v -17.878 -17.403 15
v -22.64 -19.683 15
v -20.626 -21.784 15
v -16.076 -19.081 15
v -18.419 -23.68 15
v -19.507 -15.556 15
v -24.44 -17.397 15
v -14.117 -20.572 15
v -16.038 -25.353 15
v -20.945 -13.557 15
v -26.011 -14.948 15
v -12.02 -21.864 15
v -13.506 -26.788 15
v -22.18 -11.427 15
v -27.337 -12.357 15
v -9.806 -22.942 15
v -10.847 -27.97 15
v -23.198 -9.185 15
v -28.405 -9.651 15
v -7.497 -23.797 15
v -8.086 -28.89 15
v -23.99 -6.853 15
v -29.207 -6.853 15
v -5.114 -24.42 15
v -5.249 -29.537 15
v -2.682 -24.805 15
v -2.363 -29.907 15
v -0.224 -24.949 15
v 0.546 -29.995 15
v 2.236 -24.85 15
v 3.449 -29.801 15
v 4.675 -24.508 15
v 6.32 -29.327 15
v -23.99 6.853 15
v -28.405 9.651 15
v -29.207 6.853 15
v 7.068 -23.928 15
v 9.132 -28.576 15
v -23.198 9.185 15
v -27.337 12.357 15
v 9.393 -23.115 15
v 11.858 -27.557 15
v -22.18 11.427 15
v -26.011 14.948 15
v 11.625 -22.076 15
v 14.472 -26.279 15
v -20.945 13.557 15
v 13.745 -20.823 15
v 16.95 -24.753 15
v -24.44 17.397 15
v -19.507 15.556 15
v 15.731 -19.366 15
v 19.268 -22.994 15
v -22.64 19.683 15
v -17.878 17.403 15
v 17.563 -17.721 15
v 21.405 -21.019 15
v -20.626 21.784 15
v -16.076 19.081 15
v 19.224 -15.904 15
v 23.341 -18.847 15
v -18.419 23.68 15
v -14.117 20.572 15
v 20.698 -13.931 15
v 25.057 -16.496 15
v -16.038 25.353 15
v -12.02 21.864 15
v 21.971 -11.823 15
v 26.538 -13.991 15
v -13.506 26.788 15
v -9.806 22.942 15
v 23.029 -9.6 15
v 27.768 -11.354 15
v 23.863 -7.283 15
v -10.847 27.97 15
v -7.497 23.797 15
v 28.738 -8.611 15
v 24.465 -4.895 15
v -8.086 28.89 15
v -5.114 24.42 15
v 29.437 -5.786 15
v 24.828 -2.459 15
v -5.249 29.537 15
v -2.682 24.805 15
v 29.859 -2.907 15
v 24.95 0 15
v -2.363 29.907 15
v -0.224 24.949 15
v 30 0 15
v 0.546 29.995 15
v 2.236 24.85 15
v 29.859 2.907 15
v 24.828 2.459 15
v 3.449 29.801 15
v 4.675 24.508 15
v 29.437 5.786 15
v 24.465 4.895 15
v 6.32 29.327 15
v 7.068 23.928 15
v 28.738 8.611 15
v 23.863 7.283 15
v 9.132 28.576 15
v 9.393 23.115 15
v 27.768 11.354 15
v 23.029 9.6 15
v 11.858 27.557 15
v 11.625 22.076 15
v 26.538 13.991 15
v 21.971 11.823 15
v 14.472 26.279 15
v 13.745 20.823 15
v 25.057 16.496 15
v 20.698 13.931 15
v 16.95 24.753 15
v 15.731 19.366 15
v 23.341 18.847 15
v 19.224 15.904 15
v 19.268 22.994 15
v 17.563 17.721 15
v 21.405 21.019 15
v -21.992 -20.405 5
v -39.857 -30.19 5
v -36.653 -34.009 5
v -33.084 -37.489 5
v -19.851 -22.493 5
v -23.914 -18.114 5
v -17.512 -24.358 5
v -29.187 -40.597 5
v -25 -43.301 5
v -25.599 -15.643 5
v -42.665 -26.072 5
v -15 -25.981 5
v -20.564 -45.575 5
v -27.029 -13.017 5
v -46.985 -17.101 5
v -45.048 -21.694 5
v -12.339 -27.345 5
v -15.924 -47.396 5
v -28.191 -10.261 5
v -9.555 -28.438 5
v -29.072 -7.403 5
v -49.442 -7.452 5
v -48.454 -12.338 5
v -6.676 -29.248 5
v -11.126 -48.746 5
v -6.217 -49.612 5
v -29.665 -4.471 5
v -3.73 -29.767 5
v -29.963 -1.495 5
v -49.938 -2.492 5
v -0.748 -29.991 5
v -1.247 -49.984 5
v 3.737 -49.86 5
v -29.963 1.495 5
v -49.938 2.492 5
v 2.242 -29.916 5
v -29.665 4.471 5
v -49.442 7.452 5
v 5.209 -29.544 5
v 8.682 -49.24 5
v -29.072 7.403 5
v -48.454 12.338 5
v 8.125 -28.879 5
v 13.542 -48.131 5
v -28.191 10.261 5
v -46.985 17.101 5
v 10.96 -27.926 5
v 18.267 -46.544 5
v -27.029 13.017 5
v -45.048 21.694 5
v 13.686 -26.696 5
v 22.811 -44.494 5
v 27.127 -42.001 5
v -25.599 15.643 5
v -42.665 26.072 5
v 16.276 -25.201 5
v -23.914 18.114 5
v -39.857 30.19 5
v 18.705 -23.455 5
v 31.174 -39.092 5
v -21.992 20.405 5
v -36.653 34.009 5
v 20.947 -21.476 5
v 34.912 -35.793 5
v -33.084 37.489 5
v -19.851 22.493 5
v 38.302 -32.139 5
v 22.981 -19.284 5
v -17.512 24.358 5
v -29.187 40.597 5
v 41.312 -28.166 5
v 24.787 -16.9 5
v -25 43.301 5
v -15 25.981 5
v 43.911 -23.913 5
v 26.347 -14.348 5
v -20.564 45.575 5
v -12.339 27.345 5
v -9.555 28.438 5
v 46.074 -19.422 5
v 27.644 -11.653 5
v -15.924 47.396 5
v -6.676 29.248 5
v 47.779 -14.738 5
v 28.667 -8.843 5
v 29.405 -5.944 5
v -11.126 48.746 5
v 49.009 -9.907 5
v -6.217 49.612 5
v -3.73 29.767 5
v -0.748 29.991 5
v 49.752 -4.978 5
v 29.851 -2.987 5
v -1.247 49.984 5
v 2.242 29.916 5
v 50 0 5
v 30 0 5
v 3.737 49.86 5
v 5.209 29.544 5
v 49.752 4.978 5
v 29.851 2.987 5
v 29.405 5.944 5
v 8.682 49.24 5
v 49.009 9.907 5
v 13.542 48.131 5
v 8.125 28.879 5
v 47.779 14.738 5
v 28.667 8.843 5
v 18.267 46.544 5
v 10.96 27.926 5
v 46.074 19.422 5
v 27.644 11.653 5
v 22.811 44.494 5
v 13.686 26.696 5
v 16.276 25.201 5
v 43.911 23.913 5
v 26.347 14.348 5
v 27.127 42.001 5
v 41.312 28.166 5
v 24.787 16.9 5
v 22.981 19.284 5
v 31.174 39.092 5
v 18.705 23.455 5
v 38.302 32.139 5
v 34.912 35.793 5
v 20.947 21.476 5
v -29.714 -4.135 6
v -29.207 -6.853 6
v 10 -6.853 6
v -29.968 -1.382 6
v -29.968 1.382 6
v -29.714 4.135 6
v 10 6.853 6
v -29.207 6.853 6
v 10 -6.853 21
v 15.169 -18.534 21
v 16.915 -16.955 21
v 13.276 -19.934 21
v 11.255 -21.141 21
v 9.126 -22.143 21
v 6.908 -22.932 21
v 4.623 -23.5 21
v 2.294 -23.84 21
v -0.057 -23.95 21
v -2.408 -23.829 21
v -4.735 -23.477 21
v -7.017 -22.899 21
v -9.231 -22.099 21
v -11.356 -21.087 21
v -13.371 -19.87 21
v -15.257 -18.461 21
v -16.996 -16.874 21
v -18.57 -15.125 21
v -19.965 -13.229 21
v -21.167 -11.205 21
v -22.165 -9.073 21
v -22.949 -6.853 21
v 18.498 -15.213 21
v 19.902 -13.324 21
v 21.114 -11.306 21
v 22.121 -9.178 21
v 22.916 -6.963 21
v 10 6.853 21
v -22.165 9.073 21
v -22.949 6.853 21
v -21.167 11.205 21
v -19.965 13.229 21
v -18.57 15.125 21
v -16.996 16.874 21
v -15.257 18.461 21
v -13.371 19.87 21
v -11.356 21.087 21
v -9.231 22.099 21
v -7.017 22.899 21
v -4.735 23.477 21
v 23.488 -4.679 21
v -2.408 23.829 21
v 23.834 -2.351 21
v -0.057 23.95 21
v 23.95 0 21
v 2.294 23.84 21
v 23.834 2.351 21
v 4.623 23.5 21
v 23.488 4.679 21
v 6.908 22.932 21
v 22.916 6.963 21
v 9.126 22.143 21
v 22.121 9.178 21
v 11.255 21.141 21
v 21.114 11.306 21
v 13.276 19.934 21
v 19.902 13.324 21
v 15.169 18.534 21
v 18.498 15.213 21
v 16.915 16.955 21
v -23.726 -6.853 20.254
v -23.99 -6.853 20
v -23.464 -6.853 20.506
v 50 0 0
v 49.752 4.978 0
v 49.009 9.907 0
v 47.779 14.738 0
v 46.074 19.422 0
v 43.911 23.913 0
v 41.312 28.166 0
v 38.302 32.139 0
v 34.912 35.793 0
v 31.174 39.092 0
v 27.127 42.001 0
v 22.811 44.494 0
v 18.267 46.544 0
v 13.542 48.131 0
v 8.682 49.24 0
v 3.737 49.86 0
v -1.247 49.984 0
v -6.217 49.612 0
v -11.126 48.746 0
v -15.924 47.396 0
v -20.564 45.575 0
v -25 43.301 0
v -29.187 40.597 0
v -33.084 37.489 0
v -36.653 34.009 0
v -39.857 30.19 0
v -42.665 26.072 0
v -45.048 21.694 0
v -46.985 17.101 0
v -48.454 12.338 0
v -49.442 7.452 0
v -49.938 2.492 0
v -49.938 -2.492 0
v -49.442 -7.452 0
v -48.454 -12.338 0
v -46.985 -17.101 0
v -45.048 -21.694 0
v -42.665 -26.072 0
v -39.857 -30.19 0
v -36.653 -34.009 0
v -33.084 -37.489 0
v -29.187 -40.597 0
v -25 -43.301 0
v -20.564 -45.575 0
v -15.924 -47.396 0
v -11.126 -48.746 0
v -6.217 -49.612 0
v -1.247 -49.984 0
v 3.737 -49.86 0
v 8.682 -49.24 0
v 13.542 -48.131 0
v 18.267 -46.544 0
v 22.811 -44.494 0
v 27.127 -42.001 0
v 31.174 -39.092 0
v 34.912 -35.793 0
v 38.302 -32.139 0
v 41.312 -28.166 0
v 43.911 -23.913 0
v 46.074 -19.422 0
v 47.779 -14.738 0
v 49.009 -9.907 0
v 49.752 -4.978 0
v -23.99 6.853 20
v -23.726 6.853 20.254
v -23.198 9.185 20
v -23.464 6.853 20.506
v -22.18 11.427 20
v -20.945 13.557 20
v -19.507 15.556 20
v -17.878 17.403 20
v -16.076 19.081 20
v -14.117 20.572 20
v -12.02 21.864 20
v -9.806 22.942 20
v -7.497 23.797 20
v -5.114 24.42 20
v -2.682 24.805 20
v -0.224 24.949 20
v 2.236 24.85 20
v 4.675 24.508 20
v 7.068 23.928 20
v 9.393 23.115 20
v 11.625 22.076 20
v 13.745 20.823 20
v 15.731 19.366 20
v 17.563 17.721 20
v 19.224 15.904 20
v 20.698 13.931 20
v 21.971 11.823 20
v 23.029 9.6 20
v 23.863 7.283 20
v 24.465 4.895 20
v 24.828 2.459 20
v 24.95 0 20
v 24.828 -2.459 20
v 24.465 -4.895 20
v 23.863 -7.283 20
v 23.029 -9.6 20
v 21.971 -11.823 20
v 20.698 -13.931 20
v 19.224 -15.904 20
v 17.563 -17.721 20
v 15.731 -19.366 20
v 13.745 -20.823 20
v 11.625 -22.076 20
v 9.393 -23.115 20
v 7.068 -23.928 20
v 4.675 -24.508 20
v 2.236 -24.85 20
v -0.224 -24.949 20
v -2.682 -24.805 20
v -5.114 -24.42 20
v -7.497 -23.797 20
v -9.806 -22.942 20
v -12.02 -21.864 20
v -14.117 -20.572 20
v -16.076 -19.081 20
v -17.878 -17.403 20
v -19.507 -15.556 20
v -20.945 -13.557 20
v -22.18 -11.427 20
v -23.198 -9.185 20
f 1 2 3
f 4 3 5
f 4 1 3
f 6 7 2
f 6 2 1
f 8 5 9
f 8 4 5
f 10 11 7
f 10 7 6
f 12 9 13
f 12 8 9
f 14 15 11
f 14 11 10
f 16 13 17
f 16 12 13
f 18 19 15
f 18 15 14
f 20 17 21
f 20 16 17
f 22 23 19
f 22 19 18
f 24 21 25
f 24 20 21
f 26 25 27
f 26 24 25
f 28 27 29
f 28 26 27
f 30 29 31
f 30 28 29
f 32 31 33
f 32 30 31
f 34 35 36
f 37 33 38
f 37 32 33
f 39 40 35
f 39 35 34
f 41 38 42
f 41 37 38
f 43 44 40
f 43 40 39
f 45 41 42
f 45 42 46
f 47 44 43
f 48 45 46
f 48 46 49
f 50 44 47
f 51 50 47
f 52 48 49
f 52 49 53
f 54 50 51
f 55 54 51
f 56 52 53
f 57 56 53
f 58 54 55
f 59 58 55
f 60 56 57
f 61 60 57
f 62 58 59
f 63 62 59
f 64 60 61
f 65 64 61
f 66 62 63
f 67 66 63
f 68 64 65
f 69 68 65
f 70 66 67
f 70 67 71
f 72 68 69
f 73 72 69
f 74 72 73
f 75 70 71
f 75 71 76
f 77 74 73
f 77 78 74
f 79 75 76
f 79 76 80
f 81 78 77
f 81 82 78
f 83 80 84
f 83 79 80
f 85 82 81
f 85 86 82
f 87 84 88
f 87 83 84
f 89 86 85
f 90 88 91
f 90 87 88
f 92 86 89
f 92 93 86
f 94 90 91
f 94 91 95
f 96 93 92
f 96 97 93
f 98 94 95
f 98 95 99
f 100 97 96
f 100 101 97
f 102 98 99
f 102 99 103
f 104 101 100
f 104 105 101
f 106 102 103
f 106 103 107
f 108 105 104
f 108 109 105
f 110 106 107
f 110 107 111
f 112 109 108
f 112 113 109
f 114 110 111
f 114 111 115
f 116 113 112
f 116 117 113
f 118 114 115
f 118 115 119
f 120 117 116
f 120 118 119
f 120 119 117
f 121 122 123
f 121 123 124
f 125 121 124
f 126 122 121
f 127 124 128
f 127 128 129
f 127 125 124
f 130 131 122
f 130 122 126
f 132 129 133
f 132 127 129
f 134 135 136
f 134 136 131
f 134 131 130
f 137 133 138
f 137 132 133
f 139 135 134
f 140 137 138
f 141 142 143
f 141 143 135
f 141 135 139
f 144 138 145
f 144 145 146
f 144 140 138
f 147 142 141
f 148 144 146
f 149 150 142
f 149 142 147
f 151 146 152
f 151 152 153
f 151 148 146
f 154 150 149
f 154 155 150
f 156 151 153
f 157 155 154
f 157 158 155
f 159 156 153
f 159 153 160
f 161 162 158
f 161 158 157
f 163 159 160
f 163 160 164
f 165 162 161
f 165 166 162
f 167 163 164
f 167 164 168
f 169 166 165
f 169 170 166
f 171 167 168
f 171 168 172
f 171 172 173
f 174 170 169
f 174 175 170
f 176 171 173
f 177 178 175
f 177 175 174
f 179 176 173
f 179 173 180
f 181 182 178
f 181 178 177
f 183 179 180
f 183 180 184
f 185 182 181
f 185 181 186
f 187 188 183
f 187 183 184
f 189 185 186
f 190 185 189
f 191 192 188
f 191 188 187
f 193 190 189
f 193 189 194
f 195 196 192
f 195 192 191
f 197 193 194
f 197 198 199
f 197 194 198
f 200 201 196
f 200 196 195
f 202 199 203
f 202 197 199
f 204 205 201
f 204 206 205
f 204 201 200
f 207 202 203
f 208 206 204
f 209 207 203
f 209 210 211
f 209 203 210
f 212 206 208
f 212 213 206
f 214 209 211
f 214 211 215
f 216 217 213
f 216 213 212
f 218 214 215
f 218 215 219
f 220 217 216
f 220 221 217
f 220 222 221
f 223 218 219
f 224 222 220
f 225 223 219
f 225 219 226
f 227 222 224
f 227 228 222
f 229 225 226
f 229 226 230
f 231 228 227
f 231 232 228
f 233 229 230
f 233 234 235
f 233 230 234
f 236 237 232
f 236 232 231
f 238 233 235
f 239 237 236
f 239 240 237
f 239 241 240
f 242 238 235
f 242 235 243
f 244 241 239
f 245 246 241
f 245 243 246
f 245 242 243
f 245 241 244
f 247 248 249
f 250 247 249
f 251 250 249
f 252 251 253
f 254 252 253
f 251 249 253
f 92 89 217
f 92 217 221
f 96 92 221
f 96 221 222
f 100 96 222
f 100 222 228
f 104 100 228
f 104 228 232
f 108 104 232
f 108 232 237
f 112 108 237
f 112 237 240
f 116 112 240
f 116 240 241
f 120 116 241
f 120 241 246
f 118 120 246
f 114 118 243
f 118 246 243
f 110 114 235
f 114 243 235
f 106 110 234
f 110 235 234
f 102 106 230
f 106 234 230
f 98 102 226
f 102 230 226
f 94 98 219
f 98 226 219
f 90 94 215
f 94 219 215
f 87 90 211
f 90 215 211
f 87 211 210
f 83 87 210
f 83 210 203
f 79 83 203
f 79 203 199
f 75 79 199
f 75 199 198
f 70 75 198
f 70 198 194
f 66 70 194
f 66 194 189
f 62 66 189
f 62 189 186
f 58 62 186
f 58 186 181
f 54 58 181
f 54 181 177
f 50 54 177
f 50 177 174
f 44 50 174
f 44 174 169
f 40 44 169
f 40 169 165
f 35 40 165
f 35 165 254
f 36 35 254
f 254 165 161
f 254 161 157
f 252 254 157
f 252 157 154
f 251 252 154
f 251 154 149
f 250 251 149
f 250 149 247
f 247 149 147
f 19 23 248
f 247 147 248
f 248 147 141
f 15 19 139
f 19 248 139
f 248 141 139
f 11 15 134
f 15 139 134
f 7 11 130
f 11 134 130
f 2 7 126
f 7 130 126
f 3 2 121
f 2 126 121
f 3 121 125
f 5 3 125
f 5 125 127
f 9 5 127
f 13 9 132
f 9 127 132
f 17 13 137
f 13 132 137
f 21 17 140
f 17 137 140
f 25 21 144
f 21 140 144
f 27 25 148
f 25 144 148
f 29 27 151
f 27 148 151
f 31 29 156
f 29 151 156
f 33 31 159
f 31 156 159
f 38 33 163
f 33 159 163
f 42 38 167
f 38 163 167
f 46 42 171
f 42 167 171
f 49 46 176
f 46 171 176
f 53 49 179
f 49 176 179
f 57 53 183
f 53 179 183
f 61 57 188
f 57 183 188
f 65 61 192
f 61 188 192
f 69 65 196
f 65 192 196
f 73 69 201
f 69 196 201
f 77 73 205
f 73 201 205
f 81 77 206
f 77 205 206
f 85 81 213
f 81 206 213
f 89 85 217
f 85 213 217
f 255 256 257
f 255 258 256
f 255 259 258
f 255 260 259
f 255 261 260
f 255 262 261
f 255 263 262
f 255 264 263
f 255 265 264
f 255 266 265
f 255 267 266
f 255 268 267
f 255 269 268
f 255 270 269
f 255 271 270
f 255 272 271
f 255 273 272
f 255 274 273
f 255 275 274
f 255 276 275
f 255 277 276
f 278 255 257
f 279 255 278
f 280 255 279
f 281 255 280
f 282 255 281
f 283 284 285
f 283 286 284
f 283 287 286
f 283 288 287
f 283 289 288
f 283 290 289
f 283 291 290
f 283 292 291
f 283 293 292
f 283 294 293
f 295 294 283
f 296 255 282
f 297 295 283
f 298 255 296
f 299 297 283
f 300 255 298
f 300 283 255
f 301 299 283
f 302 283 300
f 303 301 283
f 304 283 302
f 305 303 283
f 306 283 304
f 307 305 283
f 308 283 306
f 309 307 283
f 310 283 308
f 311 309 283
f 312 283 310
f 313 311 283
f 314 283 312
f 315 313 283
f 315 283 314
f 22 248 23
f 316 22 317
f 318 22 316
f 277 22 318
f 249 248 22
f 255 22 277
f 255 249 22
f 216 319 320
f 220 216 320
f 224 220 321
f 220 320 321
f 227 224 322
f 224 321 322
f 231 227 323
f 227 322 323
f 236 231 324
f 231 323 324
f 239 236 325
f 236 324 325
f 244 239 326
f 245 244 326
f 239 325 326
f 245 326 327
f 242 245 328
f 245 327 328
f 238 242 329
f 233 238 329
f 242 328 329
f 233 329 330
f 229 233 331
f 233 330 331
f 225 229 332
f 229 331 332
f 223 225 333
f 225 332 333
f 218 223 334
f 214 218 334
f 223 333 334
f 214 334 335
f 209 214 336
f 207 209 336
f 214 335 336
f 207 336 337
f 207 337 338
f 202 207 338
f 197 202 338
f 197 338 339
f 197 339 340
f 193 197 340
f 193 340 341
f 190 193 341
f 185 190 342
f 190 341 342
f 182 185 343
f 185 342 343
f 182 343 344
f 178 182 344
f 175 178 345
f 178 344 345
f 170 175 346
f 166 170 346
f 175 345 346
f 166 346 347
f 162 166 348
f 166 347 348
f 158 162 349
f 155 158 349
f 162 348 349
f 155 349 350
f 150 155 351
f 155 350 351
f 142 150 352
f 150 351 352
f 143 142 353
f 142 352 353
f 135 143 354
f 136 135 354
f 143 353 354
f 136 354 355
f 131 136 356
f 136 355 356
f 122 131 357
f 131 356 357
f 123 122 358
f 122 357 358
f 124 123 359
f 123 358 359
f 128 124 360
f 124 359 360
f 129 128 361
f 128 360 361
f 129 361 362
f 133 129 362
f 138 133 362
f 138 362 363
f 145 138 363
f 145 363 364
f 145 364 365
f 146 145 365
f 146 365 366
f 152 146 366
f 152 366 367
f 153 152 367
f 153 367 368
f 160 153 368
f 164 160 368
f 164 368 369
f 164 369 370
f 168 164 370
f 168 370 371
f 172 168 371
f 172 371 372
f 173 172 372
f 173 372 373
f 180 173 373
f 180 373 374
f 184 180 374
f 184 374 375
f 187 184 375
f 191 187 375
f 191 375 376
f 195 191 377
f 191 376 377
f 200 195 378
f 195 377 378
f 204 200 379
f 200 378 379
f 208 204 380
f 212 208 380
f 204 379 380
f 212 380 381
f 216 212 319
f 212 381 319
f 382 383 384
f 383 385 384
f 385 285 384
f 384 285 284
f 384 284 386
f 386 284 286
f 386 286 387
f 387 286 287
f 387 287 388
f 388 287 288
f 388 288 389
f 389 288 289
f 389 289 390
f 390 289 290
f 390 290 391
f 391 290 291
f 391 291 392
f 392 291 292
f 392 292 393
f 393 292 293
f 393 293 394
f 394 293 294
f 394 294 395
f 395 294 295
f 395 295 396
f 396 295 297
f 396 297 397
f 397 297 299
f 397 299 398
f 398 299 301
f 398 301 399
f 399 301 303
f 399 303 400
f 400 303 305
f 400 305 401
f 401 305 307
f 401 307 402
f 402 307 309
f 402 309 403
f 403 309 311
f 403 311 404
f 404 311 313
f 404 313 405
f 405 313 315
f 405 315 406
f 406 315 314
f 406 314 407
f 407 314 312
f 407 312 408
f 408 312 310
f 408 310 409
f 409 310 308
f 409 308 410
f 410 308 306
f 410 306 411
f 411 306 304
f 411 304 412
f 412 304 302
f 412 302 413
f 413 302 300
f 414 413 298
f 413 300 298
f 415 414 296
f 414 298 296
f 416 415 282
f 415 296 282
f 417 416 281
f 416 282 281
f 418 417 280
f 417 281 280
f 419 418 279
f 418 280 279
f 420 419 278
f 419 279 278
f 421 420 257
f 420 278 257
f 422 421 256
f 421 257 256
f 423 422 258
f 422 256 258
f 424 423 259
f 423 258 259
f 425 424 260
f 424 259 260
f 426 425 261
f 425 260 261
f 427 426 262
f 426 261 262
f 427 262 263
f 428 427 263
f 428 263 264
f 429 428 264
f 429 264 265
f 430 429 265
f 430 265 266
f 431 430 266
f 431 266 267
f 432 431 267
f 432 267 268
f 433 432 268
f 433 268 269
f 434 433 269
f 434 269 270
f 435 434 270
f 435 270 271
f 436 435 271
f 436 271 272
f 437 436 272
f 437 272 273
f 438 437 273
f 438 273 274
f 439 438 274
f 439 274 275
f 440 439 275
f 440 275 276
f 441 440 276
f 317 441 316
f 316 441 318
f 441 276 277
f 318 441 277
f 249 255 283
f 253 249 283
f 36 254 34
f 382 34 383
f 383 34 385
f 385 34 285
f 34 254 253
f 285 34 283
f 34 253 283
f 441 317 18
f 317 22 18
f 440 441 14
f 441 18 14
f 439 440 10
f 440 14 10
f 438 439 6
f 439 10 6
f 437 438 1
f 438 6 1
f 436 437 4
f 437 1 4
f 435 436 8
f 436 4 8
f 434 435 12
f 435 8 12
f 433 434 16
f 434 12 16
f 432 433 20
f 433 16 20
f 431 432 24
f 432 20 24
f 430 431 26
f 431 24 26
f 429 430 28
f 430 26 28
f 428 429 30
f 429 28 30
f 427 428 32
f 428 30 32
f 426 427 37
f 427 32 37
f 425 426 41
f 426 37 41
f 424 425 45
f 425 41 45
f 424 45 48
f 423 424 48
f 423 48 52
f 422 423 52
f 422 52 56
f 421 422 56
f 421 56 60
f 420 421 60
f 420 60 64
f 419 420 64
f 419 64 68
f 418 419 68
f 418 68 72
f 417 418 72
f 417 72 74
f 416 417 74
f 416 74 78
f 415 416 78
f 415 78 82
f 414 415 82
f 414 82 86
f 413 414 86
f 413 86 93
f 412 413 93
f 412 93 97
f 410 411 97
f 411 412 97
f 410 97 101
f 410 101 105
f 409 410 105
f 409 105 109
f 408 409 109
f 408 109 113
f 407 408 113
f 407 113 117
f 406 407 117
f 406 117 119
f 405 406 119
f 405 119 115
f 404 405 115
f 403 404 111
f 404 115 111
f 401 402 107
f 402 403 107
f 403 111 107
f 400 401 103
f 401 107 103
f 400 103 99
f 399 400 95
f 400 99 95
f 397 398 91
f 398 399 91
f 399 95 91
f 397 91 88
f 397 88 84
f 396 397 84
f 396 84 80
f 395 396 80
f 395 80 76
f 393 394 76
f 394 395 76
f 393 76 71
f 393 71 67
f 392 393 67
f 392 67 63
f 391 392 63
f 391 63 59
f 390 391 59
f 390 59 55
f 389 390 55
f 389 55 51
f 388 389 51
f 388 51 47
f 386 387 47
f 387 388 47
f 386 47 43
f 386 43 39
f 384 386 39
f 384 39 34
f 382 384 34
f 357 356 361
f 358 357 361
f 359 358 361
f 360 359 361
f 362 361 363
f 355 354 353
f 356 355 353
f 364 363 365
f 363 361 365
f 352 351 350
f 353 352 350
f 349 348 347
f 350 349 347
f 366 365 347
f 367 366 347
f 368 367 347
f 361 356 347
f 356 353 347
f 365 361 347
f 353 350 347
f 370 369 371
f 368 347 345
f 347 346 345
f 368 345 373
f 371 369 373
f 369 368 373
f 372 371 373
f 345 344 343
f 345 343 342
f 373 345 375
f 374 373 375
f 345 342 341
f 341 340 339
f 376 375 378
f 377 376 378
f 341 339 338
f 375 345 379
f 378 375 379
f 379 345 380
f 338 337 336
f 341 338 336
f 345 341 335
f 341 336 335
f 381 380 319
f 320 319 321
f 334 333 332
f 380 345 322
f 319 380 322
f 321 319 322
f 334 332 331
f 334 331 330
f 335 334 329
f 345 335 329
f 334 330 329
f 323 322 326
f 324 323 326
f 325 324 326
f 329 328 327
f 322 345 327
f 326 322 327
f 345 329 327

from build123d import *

# Parameters (mm, degrees)
F0_R          = 50
F1_DEPTH      = 5
F2_R          = 30
F3_DEPTH      = 10
F4_R          = 24.95
F5_DEPTH      = 6
F6_W          = 13.7062855065
F6_H          = 30
F7_DEPTH      = 100
F7_DEPTH_BACK = 10
F8_SIZE       = 1


with BuildPart() as f1:
    # F0 (on Top) → F1 (new body)
    with BuildSketch(Plane.XY):
        Circle(F0_R)
    extrude(amount=F1_DEPTH)

    # F2 (on face) → F3 (join)
    with BuildSketch(Plane.XY.offset(5)):
        Circle(F2_R)
    extrude(amount=F3_DEPTH)

    # F4 (on face) → F5 (join)
    with BuildSketch(Plane.XY.offset(15)):
        Circle(F4_R)
    extrude(amount=F5_DEPTH)

    # F6 (on Right) → F7 (cut, two sides)
    with BuildSketch(Plane.YZ) as f7_sk:
        with Locations((0, 21)):
            Rectangle(F6_W, F6_H)
    extrude(amount=-F7_DEPTH, mode=Mode.SUBTRACT)
    extrude(f7_sk.sketch, amount=F7_DEPTH_BACK, mode=Mode.SUBTRACT)

    # F8
    f8_edges = [f1.edges().sort_by_distance(p)[0] for p in [
        (24.95, 0, 21),
    ]]
    chamfer(f8_edges, length=F8_SIZE)


solid = f1.part
